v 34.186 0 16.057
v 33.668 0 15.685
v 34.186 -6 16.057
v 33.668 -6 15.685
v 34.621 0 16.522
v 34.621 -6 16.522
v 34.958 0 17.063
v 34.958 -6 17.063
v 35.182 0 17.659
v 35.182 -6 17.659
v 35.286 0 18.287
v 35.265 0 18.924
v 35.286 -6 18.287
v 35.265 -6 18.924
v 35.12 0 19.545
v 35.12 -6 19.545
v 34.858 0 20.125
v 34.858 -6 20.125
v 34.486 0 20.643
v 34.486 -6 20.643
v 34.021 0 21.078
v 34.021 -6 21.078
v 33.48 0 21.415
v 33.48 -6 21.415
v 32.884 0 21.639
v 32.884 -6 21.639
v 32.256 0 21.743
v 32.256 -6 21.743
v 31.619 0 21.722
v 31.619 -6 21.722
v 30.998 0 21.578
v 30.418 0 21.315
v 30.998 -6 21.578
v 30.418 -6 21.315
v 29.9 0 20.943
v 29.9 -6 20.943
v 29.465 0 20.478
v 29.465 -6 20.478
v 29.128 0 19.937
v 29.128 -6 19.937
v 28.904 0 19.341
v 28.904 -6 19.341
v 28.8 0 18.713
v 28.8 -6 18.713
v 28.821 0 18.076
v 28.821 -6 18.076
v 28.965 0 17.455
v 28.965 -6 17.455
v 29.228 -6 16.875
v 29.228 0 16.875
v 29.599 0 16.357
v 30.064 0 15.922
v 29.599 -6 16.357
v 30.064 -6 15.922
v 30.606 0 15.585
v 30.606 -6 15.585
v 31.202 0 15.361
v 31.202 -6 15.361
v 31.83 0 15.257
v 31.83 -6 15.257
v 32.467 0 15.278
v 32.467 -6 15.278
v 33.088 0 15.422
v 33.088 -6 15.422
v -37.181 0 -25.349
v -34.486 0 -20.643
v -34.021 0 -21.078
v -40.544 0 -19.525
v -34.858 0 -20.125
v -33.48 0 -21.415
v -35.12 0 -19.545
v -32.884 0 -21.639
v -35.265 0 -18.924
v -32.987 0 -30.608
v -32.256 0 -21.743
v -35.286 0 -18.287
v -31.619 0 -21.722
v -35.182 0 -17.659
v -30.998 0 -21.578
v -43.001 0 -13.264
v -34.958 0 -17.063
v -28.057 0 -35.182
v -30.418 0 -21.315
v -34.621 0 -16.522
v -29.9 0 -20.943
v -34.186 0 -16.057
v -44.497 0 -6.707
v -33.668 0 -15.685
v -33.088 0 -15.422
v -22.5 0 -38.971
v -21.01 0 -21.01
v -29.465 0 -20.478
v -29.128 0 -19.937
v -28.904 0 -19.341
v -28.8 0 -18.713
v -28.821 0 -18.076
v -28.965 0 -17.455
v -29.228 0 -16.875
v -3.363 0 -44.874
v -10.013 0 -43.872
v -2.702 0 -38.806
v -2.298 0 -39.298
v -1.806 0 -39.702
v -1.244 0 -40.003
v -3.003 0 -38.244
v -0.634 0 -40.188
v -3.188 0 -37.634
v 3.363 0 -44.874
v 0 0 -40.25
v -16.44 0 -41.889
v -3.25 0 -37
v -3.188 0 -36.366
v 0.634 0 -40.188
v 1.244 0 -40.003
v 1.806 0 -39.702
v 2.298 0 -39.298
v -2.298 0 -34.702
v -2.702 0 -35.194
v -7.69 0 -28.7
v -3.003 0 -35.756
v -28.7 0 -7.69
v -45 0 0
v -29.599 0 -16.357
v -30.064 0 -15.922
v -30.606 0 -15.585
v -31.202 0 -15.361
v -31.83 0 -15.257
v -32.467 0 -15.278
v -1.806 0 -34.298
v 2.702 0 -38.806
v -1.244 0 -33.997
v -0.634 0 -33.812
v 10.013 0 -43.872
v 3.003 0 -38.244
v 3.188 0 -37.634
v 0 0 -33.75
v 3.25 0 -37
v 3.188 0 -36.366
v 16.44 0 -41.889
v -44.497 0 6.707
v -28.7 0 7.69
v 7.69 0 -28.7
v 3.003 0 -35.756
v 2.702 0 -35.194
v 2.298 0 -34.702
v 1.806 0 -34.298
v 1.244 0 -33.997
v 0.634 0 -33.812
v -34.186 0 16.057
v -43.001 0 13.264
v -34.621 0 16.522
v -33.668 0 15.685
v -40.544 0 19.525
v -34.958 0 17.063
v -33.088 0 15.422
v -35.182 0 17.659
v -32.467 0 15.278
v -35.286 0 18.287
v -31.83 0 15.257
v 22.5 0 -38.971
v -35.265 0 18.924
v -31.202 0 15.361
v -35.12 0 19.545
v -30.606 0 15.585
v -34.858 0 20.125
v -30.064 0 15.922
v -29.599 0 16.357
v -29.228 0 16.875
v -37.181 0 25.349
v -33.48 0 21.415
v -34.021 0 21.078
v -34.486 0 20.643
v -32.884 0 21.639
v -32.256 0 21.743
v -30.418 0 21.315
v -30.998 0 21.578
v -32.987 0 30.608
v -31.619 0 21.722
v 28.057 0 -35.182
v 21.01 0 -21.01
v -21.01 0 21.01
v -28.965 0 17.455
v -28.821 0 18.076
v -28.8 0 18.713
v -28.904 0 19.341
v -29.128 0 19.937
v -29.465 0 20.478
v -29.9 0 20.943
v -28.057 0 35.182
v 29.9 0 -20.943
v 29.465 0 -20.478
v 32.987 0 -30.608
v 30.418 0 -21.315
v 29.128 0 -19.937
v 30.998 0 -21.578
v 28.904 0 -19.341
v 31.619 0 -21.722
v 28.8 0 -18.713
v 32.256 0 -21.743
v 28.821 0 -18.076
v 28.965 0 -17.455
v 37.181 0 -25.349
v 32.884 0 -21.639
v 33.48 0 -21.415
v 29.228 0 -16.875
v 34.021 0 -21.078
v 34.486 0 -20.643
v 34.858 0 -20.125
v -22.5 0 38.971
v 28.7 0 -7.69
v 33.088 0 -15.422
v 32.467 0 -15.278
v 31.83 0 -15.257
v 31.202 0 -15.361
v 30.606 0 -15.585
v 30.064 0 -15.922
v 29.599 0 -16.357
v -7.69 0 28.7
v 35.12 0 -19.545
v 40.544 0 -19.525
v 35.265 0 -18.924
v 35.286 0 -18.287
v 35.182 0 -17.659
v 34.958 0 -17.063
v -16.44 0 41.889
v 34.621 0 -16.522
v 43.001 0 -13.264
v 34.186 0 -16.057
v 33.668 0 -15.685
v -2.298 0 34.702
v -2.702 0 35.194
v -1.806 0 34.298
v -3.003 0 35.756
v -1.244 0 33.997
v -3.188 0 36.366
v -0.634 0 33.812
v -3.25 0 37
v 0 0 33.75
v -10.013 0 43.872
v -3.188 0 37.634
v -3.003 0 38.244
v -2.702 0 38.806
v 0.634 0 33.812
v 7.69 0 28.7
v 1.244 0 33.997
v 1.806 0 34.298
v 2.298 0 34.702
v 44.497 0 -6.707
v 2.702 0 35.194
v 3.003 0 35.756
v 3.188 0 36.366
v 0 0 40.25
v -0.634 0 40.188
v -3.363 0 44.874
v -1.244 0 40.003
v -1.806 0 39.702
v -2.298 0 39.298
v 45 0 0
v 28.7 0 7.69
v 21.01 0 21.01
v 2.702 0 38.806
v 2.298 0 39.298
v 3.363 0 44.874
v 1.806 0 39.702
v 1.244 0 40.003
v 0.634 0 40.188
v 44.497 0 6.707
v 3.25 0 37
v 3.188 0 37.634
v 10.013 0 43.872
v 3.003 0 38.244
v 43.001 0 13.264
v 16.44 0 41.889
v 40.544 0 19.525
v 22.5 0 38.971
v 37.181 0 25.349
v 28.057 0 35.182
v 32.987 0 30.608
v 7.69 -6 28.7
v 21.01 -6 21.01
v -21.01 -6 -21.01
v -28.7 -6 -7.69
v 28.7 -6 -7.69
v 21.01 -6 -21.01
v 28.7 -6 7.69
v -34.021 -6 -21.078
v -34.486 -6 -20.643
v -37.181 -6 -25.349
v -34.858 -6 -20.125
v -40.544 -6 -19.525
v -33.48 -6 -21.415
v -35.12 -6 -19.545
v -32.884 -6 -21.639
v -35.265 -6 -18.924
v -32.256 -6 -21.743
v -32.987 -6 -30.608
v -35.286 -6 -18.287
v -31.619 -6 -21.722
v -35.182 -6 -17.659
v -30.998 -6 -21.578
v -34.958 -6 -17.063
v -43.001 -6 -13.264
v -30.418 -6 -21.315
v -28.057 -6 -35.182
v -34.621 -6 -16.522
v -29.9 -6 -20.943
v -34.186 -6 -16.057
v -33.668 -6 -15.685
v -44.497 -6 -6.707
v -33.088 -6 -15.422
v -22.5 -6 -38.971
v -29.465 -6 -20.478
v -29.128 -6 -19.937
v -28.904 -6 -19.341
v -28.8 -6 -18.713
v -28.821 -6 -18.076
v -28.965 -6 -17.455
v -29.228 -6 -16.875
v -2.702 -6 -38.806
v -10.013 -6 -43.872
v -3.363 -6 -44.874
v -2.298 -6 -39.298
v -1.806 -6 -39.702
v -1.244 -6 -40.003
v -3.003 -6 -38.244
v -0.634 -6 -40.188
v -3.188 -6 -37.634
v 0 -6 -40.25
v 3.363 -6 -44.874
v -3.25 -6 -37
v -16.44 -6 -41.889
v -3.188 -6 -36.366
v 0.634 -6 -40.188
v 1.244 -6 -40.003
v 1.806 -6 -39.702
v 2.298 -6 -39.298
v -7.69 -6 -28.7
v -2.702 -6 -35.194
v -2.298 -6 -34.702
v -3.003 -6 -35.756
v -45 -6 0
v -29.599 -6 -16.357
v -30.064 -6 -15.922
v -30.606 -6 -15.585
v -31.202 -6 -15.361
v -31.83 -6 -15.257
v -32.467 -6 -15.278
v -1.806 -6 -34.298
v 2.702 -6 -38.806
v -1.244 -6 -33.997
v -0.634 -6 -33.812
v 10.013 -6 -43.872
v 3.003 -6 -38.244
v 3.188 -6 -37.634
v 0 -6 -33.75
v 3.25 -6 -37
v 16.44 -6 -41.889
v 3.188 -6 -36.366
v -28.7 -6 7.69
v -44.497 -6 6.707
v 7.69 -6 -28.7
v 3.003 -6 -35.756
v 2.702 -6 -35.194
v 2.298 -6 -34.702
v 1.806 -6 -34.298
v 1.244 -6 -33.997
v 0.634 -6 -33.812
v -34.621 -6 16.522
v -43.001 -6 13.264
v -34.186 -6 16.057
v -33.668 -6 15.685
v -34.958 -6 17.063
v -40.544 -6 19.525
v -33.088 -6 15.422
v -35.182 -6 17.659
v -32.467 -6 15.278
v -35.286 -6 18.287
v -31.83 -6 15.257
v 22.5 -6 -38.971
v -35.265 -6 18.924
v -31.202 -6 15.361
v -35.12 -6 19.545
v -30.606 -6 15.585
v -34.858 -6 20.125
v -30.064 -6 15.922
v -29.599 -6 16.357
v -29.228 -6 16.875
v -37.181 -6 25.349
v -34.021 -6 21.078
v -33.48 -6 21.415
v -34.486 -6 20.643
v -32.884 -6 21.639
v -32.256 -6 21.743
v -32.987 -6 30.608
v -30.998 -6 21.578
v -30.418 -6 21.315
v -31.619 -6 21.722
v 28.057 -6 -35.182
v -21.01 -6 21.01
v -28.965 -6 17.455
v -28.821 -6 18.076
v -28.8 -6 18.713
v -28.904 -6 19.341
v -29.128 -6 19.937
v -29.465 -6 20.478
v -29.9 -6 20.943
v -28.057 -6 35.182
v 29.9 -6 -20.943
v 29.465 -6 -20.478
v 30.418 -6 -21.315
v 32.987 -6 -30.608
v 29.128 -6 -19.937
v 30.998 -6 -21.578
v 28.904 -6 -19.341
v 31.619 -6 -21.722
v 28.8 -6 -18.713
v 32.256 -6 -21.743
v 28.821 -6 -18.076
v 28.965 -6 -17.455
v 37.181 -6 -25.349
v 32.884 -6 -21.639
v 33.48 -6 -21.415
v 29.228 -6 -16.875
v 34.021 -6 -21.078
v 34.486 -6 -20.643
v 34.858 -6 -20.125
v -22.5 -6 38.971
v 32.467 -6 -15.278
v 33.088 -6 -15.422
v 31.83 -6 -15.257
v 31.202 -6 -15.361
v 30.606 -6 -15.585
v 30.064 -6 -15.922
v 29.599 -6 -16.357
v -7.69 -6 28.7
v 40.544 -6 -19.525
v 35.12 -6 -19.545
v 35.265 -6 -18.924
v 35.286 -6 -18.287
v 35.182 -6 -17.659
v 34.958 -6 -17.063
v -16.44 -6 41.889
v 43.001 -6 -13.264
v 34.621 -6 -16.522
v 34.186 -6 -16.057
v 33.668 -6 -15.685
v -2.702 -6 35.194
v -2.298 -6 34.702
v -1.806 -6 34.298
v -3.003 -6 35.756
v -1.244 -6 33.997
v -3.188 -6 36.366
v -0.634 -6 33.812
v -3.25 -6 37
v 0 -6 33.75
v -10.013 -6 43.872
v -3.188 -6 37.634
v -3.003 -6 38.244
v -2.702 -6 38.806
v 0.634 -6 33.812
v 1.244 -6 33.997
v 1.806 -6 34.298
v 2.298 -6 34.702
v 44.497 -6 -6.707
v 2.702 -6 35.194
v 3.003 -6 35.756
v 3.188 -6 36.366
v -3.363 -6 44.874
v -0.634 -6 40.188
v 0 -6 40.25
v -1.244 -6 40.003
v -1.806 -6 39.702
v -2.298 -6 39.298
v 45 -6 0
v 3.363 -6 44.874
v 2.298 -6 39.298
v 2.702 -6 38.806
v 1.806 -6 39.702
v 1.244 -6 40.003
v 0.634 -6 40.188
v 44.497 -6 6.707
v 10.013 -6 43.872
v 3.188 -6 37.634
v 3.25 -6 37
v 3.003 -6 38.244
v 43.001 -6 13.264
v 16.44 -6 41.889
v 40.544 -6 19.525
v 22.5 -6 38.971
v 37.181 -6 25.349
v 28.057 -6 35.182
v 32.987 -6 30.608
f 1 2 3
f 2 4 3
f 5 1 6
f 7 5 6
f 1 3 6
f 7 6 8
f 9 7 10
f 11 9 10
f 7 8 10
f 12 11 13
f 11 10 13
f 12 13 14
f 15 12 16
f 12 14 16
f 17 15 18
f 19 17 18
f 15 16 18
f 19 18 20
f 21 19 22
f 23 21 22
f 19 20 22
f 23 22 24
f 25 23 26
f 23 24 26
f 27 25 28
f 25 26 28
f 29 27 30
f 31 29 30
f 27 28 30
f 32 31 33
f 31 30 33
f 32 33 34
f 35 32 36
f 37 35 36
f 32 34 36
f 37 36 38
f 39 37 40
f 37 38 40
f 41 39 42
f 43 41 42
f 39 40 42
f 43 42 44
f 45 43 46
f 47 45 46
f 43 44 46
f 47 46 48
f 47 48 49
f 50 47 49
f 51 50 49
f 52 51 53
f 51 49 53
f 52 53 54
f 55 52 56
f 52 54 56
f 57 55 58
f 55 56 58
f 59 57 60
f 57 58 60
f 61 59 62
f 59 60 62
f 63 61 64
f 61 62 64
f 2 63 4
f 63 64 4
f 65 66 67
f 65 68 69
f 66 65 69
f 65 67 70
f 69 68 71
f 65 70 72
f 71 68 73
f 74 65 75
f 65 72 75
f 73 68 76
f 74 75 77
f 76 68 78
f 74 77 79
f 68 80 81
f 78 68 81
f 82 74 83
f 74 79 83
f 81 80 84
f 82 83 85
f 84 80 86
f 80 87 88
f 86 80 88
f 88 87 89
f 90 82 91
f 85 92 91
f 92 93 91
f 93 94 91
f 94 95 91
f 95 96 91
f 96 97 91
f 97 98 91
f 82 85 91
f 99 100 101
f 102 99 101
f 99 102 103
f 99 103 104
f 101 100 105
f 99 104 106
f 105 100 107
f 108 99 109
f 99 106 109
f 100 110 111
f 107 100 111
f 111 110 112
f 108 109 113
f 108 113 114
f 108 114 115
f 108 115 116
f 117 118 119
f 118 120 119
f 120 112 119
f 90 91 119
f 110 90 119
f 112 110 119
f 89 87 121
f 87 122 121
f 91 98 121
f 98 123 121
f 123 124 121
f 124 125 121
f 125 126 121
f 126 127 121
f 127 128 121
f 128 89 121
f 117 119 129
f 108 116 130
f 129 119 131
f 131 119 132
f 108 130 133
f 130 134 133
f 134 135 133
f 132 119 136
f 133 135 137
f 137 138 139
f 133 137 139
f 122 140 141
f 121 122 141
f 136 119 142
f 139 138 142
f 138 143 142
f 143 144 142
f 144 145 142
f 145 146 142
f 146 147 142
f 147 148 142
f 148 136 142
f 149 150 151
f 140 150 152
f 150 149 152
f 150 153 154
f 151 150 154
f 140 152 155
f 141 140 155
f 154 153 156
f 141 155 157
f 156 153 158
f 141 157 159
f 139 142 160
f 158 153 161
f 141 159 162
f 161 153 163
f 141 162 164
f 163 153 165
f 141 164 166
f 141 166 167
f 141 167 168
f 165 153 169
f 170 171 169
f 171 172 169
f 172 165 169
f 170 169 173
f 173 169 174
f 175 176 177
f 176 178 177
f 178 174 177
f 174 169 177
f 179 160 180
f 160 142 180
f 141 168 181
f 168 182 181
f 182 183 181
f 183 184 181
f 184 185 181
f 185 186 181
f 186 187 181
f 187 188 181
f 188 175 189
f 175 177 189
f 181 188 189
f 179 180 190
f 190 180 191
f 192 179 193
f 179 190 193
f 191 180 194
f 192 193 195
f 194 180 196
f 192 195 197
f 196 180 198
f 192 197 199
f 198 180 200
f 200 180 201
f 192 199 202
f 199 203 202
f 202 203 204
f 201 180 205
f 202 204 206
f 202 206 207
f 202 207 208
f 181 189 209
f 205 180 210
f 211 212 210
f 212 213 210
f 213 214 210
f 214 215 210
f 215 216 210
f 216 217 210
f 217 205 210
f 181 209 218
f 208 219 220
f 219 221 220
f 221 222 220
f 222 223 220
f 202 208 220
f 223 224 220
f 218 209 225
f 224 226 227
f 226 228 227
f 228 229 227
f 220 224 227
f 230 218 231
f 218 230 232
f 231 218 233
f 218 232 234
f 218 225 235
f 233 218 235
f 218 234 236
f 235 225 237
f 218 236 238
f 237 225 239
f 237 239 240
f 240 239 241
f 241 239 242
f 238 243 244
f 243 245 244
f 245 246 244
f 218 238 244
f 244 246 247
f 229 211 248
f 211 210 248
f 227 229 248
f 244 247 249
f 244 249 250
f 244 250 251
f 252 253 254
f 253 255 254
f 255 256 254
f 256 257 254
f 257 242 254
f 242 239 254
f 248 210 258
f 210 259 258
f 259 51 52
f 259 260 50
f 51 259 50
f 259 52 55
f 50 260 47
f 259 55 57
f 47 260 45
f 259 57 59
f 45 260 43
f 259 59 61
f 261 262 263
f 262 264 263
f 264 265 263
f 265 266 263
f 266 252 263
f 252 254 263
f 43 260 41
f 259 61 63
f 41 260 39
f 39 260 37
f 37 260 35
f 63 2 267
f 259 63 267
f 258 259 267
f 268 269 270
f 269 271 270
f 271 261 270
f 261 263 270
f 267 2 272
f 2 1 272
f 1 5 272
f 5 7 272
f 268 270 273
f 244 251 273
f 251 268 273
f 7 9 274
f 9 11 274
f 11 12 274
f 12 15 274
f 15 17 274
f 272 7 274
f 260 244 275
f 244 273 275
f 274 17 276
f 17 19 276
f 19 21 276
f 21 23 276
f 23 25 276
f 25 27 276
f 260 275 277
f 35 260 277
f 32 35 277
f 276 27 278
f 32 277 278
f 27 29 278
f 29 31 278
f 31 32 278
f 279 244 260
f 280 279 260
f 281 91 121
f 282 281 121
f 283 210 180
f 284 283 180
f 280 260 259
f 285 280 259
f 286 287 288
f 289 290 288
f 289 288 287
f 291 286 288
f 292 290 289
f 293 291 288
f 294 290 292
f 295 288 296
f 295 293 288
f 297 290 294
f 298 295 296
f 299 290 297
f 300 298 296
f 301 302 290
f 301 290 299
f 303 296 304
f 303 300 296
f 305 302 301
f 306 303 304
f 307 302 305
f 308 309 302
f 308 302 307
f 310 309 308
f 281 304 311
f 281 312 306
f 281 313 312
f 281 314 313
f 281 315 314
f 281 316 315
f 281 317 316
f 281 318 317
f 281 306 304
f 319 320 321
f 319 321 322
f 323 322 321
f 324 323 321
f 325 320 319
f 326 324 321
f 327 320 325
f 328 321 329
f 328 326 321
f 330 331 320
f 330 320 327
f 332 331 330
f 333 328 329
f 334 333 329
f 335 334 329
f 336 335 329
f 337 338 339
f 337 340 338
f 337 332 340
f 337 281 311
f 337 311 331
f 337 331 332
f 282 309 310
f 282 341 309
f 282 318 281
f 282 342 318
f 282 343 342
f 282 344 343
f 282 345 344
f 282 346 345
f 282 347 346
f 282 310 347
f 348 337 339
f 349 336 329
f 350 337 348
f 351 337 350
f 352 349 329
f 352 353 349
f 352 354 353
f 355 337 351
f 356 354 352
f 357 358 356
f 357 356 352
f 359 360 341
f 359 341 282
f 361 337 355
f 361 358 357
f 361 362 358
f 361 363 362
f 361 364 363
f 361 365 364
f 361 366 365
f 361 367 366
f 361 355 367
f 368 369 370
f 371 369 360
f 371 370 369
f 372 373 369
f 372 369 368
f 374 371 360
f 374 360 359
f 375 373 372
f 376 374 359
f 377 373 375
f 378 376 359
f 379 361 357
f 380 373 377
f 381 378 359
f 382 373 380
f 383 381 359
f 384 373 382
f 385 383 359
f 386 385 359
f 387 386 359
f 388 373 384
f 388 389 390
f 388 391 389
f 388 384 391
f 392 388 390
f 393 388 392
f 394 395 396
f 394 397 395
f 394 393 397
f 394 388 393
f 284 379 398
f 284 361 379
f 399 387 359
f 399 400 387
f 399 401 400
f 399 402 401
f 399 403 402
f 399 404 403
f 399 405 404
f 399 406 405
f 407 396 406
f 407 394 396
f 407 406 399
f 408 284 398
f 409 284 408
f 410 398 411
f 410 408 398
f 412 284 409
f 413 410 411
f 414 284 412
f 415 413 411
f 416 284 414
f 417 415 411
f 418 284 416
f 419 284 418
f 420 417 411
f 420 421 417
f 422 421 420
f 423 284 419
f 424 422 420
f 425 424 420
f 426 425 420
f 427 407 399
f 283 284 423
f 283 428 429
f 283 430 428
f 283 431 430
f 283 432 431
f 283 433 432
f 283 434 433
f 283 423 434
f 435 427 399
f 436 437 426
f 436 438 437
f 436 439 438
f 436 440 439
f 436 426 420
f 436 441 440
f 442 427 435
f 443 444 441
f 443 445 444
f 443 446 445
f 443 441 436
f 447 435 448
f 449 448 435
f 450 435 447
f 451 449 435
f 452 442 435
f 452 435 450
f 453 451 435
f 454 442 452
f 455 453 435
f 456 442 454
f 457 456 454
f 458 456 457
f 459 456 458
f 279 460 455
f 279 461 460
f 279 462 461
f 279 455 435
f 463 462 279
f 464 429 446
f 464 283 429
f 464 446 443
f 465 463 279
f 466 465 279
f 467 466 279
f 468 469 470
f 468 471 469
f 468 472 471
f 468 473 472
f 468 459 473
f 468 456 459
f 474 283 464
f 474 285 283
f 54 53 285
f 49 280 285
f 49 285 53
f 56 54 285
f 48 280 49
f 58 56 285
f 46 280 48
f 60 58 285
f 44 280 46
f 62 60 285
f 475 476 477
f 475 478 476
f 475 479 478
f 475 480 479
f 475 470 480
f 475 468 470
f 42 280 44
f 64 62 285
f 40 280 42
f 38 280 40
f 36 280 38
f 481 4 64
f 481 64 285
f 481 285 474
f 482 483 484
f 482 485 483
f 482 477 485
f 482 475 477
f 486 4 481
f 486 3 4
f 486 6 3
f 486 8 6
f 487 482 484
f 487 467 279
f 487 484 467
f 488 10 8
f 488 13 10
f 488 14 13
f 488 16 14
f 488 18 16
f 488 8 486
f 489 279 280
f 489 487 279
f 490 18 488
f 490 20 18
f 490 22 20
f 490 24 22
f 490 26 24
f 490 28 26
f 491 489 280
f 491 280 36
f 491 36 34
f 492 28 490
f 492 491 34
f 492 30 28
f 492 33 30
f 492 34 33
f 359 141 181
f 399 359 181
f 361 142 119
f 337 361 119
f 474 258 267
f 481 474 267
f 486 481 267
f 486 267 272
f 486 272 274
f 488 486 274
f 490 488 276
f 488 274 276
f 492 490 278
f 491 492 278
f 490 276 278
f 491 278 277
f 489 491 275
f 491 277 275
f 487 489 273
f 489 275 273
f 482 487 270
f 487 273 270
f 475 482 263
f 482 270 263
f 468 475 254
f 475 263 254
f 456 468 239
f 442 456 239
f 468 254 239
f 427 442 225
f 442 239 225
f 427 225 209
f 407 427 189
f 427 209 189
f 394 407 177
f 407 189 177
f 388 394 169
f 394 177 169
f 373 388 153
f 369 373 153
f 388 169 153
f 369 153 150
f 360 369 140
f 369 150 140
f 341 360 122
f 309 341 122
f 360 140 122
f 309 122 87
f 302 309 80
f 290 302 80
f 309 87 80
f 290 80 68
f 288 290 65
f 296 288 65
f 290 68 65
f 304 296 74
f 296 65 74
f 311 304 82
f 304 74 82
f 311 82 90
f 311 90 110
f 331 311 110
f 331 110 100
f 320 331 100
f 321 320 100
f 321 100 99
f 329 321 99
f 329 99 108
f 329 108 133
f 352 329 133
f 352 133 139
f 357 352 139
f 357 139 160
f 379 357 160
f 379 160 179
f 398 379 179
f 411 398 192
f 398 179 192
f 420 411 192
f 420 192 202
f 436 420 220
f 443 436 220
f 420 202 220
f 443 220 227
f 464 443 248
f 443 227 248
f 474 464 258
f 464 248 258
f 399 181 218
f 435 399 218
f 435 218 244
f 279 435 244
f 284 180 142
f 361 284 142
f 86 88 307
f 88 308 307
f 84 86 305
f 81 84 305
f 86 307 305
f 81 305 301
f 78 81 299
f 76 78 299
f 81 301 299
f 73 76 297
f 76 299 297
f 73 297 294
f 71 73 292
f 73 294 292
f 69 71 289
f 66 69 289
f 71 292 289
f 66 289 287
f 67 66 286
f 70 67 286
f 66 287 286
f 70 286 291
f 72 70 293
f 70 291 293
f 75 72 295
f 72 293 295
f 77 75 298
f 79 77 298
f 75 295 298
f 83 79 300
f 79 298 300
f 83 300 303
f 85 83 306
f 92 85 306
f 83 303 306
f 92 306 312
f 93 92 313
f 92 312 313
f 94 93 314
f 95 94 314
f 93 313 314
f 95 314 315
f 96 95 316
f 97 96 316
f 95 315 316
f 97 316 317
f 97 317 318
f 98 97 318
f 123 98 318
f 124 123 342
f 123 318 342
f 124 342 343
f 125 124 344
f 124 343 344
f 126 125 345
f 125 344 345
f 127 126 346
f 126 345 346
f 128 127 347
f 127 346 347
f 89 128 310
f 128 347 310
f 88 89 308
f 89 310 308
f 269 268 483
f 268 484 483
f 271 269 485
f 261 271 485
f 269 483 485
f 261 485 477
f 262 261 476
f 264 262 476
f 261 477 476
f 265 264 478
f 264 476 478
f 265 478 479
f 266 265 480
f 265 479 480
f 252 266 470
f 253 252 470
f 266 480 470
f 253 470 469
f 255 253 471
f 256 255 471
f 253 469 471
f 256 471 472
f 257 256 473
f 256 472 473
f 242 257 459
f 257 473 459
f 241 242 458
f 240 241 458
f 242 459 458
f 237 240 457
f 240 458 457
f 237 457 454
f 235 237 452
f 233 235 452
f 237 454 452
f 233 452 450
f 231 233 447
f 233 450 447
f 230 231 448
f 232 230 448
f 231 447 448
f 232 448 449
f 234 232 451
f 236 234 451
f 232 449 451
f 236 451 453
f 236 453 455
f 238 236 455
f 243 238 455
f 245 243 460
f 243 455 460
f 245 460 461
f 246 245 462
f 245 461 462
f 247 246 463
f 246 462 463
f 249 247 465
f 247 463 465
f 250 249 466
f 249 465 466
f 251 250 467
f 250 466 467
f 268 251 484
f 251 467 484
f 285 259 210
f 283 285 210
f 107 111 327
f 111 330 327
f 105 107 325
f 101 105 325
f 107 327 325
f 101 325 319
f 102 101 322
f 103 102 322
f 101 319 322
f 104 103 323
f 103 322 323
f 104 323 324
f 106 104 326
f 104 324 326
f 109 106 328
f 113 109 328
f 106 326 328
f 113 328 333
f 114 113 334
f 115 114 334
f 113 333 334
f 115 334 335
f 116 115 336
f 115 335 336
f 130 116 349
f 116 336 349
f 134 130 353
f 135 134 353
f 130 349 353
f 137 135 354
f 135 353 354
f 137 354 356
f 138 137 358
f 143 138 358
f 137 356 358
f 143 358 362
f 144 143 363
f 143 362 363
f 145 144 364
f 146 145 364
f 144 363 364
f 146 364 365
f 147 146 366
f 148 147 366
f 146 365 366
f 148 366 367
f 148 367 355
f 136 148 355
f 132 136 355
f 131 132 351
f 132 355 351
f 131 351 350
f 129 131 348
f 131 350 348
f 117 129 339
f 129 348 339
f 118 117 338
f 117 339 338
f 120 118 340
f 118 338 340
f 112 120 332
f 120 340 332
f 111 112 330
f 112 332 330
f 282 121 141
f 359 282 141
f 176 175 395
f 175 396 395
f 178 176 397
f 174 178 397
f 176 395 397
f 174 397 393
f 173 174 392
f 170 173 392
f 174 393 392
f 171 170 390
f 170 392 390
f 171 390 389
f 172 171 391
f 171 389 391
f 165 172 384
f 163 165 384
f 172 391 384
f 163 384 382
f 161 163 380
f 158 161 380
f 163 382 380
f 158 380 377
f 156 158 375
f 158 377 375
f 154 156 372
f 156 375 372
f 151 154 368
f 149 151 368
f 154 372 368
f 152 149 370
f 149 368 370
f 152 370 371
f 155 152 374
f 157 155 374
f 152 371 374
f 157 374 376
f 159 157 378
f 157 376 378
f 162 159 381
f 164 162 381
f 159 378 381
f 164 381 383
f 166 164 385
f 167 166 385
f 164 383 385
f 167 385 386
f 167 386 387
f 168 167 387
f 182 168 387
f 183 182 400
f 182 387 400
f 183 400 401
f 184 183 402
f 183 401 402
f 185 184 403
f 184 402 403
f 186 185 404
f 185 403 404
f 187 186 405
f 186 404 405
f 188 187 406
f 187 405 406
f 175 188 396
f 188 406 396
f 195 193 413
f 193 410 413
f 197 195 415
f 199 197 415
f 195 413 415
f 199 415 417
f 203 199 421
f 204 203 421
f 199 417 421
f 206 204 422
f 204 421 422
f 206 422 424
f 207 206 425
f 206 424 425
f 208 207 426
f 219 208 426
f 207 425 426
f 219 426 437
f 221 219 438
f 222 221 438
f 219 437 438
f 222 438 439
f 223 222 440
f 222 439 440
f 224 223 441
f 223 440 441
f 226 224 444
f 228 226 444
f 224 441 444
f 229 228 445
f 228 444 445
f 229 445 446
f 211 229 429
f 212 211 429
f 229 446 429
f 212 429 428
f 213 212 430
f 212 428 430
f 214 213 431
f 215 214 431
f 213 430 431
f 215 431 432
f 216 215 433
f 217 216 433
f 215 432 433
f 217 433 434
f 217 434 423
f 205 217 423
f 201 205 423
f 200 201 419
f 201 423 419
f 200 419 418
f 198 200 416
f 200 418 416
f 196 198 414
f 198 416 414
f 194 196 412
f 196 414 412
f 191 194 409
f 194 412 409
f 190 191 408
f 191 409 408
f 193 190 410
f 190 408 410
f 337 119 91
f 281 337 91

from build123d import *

# Parameters (mm, degrees)
F0_R            = 45
F1_DEPTH        = 6
F2_R            = 3.25
F3_DEPTH        = 12.5
F3_COPIES_COUNT = 6


# Not quite as in the source:
# - a pattern or mirror of a feature is missing from the dataset's text; its kind, count and spacing are read off the source's solid


with BuildPart() as f1:
    # F0 (on Front) → F1 (new body)
    with BuildSketch(Plane.XZ):
        Circle(F0_R)
        Polygon((-21.0098581772, 21.0098581772), (-7.6901418228, 28.7), (7.6901418228, 28.7), (21.0098581772, 21.0098581772), (28.7, 7.6901418228), (28.7, -7.6901418228), (21.0098581772, -21.0098581772), (7.6901418228, -28.7), (-7.6901418228, -28.7), (-21.0098581772, -21.0098581772), (-28.7, -7.6901418228), (-28.7, 7.6901418228), align=None, mode=Mode.SUBTRACT)
    extrude(amount=F1_DEPTH)

    # F2 (on face) → F3 (cut, symmetric)
    with BuildSketch(Plane.XZ.offset(6)):
        with Locations((0, 37)):
            Circle(F2_R)
    f3 = extrude(amount=F3_DEPTH, both=True, mode=Mode.SUBTRACT)

    # F3_copies: F3 ×6 about axis
    f3_copies_axis = Axis((0, 0, 0), (0, 1, 0))
    for i in range(1, F3_COPIES_COUNT):
        add(f3.rotate(f3_copies_axis, i * 360 / F3_COPIES_COUNT), mode=Mode.SUBTRACT)


solid = f1.part
